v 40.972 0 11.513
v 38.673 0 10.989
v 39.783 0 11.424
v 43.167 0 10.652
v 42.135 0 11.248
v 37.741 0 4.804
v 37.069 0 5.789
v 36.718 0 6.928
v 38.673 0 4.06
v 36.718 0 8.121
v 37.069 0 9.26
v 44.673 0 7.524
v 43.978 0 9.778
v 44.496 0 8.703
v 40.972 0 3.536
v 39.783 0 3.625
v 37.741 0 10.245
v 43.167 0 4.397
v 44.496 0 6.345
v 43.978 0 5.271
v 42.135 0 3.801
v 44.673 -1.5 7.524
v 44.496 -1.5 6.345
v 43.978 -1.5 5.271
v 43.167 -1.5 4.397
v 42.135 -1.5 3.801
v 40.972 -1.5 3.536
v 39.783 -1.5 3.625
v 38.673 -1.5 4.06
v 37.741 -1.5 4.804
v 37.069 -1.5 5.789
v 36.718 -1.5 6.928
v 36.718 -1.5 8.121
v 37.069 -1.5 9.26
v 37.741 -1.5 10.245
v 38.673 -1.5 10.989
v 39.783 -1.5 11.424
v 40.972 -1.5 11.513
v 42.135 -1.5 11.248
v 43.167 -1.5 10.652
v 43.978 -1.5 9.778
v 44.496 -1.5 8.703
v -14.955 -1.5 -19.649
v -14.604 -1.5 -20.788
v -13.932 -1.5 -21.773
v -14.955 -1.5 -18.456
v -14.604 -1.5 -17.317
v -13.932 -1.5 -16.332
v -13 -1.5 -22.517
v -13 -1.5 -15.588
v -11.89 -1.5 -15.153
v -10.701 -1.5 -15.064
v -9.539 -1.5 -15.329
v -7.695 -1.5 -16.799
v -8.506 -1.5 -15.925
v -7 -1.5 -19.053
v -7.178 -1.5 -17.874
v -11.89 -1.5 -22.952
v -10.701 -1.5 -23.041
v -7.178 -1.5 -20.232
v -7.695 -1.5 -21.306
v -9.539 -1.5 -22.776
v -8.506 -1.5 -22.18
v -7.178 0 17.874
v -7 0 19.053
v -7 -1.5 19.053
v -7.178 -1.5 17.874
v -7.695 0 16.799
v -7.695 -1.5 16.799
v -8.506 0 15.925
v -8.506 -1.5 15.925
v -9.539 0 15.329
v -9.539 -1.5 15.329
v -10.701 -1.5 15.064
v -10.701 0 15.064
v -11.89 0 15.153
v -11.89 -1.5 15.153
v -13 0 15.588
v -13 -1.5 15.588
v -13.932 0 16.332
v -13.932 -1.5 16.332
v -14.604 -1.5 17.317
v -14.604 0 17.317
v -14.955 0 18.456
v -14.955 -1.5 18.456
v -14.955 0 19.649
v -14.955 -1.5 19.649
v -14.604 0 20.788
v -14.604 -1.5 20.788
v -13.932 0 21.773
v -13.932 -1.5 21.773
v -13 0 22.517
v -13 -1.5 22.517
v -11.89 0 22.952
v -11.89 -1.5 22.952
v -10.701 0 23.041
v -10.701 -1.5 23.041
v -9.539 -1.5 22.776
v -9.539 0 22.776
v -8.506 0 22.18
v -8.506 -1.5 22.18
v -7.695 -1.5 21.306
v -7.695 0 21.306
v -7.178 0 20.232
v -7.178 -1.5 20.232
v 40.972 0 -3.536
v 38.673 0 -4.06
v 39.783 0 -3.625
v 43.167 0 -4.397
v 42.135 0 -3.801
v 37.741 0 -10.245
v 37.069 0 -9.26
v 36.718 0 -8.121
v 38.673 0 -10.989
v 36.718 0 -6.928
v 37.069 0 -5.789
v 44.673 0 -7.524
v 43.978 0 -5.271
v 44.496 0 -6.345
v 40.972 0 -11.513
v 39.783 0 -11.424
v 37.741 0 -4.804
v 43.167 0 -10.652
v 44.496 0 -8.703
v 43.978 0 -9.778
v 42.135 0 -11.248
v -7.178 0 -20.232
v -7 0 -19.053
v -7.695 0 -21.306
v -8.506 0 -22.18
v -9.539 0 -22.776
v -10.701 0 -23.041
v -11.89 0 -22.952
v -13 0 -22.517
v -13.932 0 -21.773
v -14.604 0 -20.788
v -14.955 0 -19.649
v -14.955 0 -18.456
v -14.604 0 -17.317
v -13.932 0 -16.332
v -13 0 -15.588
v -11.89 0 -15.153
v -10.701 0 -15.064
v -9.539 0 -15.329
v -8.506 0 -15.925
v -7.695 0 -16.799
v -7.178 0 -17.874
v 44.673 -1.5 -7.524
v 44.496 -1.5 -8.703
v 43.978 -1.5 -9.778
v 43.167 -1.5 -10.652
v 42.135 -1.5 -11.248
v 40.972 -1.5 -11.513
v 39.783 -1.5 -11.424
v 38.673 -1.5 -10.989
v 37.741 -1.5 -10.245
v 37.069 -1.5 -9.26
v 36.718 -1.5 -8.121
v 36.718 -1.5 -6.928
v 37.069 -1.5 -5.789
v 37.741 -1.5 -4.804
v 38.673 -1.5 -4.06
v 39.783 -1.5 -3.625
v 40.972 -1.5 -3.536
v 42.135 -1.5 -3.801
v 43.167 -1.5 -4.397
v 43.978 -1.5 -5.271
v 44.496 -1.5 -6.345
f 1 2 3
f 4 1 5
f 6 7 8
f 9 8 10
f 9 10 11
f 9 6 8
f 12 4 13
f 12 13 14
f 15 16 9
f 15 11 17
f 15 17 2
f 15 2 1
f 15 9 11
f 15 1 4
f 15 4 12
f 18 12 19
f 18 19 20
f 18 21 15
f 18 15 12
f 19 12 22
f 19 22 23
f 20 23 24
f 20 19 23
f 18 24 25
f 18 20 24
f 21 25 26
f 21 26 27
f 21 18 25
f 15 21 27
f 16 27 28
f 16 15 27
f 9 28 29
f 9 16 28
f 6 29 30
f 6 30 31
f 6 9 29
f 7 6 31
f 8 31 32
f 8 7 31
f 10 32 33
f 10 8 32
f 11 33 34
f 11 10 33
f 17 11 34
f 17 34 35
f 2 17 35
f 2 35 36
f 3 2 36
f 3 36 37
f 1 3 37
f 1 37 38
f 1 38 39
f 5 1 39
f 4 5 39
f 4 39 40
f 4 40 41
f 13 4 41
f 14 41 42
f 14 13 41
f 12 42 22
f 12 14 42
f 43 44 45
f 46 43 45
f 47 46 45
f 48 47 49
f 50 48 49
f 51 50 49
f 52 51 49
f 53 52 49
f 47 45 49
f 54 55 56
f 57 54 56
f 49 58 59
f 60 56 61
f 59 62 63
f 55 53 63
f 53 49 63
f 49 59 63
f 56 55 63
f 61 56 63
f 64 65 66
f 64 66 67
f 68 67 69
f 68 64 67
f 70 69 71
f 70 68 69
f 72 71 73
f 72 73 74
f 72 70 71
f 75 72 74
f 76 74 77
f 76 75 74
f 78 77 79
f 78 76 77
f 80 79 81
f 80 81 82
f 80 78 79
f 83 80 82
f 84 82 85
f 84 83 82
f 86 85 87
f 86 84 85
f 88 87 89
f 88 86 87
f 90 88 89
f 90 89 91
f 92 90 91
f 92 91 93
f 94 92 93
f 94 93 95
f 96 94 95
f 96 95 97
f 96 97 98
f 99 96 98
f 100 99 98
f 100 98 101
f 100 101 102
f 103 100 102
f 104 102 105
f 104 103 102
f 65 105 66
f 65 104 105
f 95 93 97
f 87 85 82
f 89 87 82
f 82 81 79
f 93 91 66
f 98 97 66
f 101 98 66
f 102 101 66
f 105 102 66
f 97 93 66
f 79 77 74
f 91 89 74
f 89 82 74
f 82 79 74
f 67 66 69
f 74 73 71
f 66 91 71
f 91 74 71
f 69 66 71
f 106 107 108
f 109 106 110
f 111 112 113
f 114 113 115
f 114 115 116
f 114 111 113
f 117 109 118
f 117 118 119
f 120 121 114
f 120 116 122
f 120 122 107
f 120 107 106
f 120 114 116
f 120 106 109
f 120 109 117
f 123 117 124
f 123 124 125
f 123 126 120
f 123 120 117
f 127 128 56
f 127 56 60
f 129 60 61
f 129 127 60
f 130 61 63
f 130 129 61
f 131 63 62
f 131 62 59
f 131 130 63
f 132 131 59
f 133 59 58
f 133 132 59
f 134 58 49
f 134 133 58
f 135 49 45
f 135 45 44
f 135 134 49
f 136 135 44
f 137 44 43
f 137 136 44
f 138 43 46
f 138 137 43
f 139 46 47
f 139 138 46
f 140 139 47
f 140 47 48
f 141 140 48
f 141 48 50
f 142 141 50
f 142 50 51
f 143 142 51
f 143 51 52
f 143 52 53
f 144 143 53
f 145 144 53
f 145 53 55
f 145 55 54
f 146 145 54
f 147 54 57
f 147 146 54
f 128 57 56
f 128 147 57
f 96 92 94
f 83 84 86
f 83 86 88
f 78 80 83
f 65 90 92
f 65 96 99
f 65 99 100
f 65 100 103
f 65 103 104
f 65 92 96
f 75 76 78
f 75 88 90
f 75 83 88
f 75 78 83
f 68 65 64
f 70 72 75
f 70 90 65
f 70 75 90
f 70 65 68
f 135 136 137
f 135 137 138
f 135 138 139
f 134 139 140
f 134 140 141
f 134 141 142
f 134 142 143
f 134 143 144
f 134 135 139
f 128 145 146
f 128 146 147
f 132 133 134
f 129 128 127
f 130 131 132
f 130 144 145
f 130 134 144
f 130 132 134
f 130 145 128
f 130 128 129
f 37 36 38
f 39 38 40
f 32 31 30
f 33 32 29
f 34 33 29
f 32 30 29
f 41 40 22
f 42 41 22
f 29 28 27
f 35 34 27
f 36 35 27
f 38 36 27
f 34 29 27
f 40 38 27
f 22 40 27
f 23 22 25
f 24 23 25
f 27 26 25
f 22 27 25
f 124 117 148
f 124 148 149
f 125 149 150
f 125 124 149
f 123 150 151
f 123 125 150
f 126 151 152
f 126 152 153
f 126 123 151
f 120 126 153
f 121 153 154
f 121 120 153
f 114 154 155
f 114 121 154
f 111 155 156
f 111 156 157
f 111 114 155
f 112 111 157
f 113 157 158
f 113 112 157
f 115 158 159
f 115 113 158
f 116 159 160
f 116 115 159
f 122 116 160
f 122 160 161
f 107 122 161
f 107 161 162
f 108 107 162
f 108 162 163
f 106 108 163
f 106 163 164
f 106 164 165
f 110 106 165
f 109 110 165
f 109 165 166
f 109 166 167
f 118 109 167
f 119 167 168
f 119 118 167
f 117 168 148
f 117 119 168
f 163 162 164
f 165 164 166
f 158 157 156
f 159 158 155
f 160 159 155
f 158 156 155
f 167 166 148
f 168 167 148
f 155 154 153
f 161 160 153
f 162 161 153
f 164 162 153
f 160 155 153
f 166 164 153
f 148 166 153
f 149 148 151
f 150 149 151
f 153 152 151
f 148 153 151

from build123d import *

# Parameters (mm, degrees)
SKETCH1_R             = 4
BOSS_EXTRUDE1_DEPTH   = 1.5
BOSS_EXTRUDE1_2_DEPTH = 1.5
BOSS_EXTRUDE1_3_DEPTH = 1.5
BOSS_EXTRUDE1_4_DEPTH = 1.5


with BuildPart() as part:
    # Sketch1 → Boss-Extrude1 (new body)
    with BuildSketch(Plane(origin=(0, 0, 0), x_dir=(1, 0, 0), z_dir=(0, 1, 0))):
        with Locations((-11, -19.052558883)):
            Circle(SKETCH1_R)
    extrude(amount=-BOSS_EXTRUDE1_DEPTH)


with BuildPart() as body_2:
    # Sketch1 → Boss-Extrude1 2 (new body)
    with BuildSketch(Plane(origin=(0, 0, 0), x_dir=(1, 0, 0), z_dir=(0, 1, 0))):
        with Locations((40.673237657, -7.524443153)):
            Circle(SKETCH1_R)
    extrude(amount=-BOSS_EXTRUDE1_2_DEPTH)


with BuildPart() as body_3:
    # Sketch1 → Boss-Extrude1 3 (new body)
    with BuildSketch(Plane(origin=(0, 0, 0), x_dir=(1, 0, 0), z_dir=(0, 1, 0))):
        with Locations((40.673237657, 7.524443153)):
            Circle(SKETCH1_R)
    extrude(amount=-BOSS_EXTRUDE1_3_DEPTH)


with BuildPart() as body_4:
    # Sketch1 → Boss-Extrude1 4 (new body)
    with BuildSketch(Plane(origin=(0, 0, 0), x_dir=(1, 0, 0), z_dir=(0, 1, 0))):
        with Locations((-11, 19.052558883)):
            Circle(SKETCH1_R)
    extrude(amount=-BOSS_EXTRUDE1_4_DEPTH)


solid = Compound([part.part, body_2.part, body_3.part, body_4.part])
